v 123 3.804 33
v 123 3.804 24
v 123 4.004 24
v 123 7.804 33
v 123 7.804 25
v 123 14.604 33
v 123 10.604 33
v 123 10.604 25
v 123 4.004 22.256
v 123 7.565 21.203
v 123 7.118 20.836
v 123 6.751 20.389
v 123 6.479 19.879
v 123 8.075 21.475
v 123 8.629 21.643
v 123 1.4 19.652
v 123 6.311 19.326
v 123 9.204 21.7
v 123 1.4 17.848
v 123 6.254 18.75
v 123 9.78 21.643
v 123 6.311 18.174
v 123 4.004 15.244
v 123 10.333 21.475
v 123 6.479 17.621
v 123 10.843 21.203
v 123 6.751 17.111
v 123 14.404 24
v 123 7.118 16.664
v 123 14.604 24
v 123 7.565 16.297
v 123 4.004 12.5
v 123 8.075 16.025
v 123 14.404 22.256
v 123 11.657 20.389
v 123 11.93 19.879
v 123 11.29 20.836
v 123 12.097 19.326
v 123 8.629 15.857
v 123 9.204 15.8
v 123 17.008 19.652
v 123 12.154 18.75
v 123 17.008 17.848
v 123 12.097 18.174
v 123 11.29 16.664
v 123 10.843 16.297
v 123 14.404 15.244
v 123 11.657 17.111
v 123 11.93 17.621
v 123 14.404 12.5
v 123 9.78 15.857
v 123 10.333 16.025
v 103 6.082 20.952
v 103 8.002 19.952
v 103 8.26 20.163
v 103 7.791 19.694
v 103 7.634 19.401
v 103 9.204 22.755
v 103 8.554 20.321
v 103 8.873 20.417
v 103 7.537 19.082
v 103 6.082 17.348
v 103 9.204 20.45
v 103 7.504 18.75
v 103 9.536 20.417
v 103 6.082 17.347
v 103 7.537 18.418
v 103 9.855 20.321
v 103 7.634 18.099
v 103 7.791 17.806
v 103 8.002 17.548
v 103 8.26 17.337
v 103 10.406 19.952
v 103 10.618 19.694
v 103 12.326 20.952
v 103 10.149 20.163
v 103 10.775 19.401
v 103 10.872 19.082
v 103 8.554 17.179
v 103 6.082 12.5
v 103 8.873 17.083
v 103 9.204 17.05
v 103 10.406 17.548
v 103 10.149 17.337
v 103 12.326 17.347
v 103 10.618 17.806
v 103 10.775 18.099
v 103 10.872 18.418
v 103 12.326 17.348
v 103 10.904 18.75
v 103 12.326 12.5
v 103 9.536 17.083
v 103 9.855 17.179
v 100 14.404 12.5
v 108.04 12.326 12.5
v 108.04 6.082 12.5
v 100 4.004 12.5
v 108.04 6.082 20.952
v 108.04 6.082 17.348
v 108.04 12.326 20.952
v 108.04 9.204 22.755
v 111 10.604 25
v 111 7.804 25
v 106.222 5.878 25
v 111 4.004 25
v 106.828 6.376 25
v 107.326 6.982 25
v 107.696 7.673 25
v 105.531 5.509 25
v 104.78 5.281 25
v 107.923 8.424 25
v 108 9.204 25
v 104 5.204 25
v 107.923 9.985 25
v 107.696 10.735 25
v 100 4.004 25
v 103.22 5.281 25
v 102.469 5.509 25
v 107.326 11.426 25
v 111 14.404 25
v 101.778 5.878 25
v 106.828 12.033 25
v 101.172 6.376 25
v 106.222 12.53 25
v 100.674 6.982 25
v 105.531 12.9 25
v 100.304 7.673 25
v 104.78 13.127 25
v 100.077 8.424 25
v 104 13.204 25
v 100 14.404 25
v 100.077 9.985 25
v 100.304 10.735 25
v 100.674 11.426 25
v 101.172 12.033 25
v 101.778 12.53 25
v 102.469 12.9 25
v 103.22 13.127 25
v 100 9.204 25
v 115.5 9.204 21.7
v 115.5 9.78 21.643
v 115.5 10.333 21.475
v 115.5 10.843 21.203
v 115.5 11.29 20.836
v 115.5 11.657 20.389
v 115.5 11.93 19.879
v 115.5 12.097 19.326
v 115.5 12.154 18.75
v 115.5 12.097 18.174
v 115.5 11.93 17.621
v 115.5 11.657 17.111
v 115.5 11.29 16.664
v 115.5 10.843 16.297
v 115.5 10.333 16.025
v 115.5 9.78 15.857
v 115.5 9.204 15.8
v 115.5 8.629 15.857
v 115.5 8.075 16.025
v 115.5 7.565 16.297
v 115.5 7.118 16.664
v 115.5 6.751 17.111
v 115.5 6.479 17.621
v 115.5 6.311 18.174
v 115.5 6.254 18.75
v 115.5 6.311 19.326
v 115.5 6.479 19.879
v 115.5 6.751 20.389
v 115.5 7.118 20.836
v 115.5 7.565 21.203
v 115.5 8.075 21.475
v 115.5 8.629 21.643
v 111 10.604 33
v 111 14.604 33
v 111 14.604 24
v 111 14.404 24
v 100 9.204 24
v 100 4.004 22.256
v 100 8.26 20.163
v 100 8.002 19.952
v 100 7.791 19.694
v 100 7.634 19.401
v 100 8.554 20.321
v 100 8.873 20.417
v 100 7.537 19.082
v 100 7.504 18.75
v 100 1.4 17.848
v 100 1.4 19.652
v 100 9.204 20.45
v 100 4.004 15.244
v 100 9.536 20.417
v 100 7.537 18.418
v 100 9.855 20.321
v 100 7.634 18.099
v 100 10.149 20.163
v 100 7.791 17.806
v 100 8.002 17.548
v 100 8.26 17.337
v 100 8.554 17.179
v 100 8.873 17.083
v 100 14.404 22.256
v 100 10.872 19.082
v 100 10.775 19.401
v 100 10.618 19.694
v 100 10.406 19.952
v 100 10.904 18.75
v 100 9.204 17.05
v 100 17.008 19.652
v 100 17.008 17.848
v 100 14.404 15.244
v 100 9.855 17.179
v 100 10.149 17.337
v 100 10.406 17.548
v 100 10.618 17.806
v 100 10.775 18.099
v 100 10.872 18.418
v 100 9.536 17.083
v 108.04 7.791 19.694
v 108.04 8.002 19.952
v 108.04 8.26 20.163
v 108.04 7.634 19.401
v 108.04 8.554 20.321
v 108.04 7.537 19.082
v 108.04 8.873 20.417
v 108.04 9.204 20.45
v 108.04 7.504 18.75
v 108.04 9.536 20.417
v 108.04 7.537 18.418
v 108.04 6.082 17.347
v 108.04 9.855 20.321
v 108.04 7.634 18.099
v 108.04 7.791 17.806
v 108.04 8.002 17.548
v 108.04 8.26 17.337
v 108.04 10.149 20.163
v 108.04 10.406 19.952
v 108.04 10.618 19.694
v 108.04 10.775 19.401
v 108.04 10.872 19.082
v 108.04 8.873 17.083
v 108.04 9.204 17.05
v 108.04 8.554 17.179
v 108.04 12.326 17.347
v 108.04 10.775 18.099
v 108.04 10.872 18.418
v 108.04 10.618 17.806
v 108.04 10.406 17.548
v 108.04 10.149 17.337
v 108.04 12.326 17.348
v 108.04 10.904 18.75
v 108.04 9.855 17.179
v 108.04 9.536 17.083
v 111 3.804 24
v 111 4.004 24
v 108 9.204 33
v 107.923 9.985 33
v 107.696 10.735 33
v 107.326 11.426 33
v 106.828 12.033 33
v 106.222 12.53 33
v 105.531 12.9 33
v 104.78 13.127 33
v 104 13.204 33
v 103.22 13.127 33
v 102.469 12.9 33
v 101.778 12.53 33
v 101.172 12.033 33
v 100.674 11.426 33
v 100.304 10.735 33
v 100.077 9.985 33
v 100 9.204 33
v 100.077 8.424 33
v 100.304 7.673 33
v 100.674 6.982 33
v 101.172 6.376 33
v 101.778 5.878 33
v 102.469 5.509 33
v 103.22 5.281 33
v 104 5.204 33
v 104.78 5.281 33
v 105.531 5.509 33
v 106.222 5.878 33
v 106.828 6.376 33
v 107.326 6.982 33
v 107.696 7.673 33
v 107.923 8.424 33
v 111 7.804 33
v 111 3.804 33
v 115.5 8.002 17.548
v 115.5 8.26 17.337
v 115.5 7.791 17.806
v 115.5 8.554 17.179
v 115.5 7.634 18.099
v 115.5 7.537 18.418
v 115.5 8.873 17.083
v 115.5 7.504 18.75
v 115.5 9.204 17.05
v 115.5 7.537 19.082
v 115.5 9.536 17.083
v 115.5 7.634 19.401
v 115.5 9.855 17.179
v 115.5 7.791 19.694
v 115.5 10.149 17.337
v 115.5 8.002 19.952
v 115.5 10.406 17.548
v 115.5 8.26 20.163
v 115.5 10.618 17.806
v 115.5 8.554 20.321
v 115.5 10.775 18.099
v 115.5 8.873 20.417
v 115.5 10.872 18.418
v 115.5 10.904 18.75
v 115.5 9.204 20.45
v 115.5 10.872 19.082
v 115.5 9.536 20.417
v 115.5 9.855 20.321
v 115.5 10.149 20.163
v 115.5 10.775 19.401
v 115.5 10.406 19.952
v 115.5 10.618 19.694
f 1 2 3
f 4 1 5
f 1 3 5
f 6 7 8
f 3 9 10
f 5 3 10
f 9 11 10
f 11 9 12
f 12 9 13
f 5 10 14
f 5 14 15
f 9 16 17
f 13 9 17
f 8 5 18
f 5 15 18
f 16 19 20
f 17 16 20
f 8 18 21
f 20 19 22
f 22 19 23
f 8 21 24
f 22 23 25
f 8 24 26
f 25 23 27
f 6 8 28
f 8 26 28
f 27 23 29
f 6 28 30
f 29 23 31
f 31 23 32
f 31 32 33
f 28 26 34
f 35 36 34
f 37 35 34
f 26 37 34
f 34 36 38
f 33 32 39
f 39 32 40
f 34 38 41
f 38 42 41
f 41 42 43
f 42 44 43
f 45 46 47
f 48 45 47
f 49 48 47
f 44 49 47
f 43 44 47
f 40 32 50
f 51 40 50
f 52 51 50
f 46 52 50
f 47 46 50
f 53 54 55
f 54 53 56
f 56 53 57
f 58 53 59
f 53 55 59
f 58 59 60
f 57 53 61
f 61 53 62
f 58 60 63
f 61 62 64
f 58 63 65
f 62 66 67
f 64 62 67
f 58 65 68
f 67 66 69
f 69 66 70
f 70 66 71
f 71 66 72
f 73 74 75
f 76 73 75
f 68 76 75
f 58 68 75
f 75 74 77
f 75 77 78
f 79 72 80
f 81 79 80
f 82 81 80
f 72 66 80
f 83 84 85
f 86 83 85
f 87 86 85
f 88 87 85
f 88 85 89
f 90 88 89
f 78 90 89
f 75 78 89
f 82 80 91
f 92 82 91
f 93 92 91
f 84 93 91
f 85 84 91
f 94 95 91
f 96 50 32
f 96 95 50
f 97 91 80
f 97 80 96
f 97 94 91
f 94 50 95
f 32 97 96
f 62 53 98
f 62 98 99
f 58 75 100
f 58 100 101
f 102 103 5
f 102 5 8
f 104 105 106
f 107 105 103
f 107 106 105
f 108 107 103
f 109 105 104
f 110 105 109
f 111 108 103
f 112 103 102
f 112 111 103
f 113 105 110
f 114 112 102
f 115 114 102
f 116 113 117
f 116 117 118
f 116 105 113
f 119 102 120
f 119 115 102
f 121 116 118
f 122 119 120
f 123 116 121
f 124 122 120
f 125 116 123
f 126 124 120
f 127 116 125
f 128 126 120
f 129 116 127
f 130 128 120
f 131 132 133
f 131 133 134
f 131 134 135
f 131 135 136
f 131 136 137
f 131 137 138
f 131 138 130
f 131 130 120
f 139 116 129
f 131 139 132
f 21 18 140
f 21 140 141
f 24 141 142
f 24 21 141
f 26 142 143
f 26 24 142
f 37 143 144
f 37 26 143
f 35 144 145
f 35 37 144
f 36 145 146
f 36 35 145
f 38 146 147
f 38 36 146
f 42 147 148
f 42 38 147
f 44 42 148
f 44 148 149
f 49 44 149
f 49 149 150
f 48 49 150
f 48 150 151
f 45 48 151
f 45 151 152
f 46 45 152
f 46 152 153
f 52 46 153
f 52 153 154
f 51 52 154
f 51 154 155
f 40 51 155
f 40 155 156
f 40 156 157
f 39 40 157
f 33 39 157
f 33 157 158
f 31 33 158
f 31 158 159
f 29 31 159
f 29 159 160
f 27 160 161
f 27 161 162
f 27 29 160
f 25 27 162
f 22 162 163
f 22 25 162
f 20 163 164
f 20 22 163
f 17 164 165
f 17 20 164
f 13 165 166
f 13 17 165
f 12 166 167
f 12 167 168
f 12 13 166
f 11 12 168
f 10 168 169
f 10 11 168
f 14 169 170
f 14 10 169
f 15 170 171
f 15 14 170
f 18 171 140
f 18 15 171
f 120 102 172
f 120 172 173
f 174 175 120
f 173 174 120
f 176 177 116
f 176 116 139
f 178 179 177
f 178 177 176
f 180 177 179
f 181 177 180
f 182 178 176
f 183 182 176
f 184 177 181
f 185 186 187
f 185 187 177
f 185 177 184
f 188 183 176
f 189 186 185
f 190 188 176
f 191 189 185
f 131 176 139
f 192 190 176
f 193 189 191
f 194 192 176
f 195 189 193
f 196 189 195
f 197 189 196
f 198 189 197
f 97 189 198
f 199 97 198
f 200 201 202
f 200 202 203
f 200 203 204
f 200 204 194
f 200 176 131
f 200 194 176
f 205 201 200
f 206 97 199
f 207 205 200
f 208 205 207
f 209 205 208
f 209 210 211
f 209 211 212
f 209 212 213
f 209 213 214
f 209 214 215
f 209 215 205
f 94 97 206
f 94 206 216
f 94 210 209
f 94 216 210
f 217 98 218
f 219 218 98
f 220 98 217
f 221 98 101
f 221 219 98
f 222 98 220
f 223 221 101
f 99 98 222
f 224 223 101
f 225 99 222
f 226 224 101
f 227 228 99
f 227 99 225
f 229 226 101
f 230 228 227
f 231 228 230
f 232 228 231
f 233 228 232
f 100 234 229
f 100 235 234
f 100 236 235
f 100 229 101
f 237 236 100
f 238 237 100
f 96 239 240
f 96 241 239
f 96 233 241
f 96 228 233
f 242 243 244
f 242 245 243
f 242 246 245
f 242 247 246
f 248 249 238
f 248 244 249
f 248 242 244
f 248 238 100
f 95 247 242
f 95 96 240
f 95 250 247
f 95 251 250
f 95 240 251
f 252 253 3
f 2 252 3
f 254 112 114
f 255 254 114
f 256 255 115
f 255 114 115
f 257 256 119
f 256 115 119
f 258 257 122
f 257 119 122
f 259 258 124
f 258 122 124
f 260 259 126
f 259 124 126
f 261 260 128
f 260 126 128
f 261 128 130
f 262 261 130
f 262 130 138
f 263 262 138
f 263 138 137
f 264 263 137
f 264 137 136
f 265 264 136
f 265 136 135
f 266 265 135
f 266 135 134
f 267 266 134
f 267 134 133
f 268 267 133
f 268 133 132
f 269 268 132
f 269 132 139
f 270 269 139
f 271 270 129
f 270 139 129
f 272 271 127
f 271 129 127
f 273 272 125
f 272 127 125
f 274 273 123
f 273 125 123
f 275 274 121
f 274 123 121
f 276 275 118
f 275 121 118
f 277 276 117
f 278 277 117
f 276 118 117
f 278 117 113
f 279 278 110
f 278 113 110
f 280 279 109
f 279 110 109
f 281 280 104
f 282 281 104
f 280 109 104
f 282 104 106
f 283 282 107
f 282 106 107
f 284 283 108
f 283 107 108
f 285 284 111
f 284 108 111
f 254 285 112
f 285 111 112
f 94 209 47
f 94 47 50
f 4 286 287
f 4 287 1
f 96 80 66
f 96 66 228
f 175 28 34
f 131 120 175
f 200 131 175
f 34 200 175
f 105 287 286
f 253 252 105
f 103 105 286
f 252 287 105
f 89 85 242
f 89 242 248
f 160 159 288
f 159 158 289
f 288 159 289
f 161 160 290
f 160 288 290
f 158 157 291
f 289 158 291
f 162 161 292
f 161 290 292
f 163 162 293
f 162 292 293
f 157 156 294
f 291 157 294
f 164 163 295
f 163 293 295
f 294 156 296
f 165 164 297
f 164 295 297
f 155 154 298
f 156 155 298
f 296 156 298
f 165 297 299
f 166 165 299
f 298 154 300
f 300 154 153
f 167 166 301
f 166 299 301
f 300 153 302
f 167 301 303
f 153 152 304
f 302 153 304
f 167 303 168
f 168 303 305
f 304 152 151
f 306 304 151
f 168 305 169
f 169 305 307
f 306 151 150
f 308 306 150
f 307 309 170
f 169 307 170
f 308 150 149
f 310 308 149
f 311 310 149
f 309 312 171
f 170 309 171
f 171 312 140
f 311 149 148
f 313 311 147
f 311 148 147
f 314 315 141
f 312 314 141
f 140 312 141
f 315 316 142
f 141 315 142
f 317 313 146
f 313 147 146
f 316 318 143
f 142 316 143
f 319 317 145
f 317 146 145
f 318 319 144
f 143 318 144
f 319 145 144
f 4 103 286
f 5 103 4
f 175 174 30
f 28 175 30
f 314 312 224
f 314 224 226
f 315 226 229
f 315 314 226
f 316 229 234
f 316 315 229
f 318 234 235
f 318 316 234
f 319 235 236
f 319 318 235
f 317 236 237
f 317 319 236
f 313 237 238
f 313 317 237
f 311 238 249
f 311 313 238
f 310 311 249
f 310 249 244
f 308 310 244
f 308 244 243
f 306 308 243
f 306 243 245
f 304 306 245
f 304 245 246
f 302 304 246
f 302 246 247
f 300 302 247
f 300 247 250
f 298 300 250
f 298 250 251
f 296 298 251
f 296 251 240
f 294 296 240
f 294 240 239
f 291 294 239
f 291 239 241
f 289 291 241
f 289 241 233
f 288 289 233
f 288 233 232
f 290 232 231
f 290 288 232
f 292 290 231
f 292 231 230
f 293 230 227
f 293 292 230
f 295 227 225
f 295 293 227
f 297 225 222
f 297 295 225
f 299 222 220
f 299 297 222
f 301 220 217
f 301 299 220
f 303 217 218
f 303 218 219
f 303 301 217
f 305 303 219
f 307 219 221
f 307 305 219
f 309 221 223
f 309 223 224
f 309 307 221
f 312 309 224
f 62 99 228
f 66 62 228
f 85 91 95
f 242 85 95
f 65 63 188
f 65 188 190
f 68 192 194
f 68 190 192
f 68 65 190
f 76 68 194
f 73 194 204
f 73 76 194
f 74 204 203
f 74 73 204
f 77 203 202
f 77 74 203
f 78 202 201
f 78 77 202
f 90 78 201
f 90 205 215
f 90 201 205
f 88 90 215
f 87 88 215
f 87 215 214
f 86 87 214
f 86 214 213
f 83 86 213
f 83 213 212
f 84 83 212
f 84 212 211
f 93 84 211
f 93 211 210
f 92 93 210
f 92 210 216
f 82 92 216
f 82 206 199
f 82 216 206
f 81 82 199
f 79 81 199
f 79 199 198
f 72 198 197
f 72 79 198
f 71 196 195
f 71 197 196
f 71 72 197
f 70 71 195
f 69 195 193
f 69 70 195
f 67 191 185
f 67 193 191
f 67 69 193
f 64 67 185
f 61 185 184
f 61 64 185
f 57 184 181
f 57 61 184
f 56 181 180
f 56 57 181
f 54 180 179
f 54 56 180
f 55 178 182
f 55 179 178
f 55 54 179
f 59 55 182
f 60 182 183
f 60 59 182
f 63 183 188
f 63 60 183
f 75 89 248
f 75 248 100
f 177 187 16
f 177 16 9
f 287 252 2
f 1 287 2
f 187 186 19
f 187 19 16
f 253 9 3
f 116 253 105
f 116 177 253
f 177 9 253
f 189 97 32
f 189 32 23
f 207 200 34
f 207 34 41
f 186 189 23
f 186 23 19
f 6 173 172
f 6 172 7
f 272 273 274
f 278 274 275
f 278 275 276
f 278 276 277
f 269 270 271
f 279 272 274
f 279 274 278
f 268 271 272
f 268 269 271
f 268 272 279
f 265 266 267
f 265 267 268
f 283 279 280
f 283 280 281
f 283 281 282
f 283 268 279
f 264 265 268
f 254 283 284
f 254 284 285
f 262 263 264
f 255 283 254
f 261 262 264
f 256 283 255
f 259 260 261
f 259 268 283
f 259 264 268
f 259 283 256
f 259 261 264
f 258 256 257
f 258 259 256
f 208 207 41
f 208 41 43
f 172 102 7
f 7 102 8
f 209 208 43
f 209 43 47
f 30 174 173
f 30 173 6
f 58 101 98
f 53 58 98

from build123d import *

# Parameters (mm, degrees)
GT2CLAMP0_BASE_LSCREW_NUT_DEPTH       = 5.04
GT2CLAMP0_BASE_LSCREW_NUT_PITCH_ANGLE = 90
GT2CLAMP0_BASE_LSCREW_NUT2_W          = 5.04
GT2CLAMP0_BASE_LSCREW_NUT2_H          = 6.24386
GT2CLAMP0_BASE_LSCREW_NUT2_DEPTH      = 6.65
GT2CLAMP0_BASE_LSCREW_HEAD_R          = 2.95
GT2CLAMP0_BASE_LSCREW_HEAD_DEPTH      = 8.5
GT2CLAMP0_BASE_LSCREW_SHANK_R         = 1.7
GT2CLAMP0_BASE_LSCREW_SHANK_DEPTH     = 25
GT2CLAMP0_BASE_LSCREW_PITCH_ANGLE     = -90
GT2CLAMP0_CB3_W                       = 12
GT2CLAMP0_CB3_H                       = 4
GT2CLAMP0_CB3_DEPTH                   = 9
GT2CLAMP0_CYL_R                       = 4
GT2CLAMP0_CYL_DEPTH                   = 9
GT2CLAMP0EXTR_BASE_DEPTH              = 23
GT2CLAMP0_CB1_W                       = 12
GT2CLAMP0_CB1_H                       = 4
GT2CLAMP0_CB1_DEPTH                   = 9


with BuildPart() as gt2clamp0_base_lscrew_nut:
    # gt2clamp0_base_lscrew_nut → gt2clamp0_base_lscrew_nut (new body)
    with BuildSketch(Plane.XY):
        Polygon((3.605, 0), (1.8025, 3.122022), (-1.8025, 3.122022), (-3.605, 0), (-1.8025, -3.122022), (1.8025, -3.122022), align=None)
    extrude(amount=GT2CLAMP0_BASE_LSCREW_NUT_DEPTH)


with BuildPart() as gt2clamp0_base_lscrew_nut_1:
    # gt2clamp0_base_lscrew_nut pitch: moved
    add(gt2clamp0_base_lscrew_nut.part.rotate(Axis((0, 0, 0), (0, 1, 0)), GT2CLAMP0_BASE_LSCREW_NUT_PITCH_ANGLE))


with BuildPart() as gt2clamp0_base_lscrew_nut_2:
    # gt2clamp0_base_lscrew_nut placement: moved
    add(gt2clamp0_base_lscrew_nut_1.part.moved(Location((3, 8.004167, 6.65))))


with BuildPart() as gt2clamp0_base_lscrew_nut2:
    # gt2clamp0_base_lscrew_nut2 → gt2clamp0_base_lscrew_nut2 (new body)
    with BuildSketch(Plane(origin=(3, 4.882237, 0), x_dir=(1, 0, 0), z_dir=(0, 0, 1))):
        with Locations((2.52, 3.12193)):
            Rectangle(GT2CLAMP0_BASE_LSCREW_NUT2_W, GT2CLAMP0_BASE_LSCREW_NUT2_H)
    extrude(amount=GT2CLAMP0_BASE_LSCREW_NUT2_DEPTH)


with BuildPart() as gt2clamp0_base_lscrew_head:
    # gt2clamp0_base_lscrew_head → gt2clamp0_base_lscrew_head (new body)
    with BuildSketch(Plane.XY.offset(-1)):
        Circle(GT2CLAMP0_BASE_LSCREW_HEAD_R)
    extrude(amount=GT2CLAMP0_BASE_LSCREW_HEAD_DEPTH)


with BuildPart() as gt2clamp0_clamp_hole:
    # gt2clamp0_base_lscrew_shank → gt2clamp0_base_lscrew_shank (new body)
    with BuildSketch(Plane.XY.offset(-1)):
        Circle(GT2CLAMP0_BASE_LSCREW_SHANK_R)
    extrude(amount=GT2CLAMP0_BASE_LSCREW_SHANK_DEPTH)

    # gt2clamp0_base_lscrew: union gt2clamp0_base_lscrew_head
    add(gt2clamp0_base_lscrew_head.part)


with BuildPart() as gt2clamp0_clamp_hole_1:
    # gt2clamp0_base_lscrew pitch: moved
    add(gt2clamp0_clamp_hole.part.rotate(Axis((0, 0, 0), (0, 1, 0)), GT2CLAMP0_BASE_LSCREW_PITCH_ANGLE))


with BuildPart() as gt2clamp0_clamp_hole_2:
    # gt2clamp0_base_lscrew placement: moved
    add(gt2clamp0_clamp_hole_1.part.moved(Location((23, 8.004167, 6.25))))

    # gt2clamp0_clamp_hole: union gt2clamp0_base_lscrew_nut, gt2clamp0_base_lscrew_nut2
    add(gt2clamp0_base_lscrew_nut_2.part)
    add(gt2clamp0_base_lscrew_nut2.part)


with BuildPart() as gt2clamp0_cb3:
    # gt2clamp0_cb3 → gt2clamp0_cb3 (new body)
    with BuildSketch(Plane(origin=(11, 9.404167, 11.5), x_dir=(1, 0, 0), z_dir=(0, 0, 1))):
        with Locations((6, 2)):
            Rectangle(GT2CLAMP0_CB3_W, GT2CLAMP0_CB3_H)
    extrude(amount=GT2CLAMP0_CB3_DEPTH)


with BuildPart() as gt2clamp0_cyl:
    # gt2clamp0_cyl → gt2clamp0_cyl (new body)
    with BuildSketch(Plane(origin=(4, 8.004167, 11.5), x_dir=(1, 0, 0), z_dir=(0, 0, 1))):
        Circle(GT2CLAMP0_CYL_R)
    extrude(amount=GT2CLAMP0_CYL_DEPTH)


with BuildPart() as gt2clamp0extr_base:
    # gt2clamp0base_plane_yz → gt2clamp0extr_base (new body)
    with BuildSketch(Plane(origin=(0, 8.004167, 6.25), x_dir=(0, 1, 0), z_dir=(-1, 0, 0))):
        Polygon((-5.2, 6.25), (-5.2, 3.50625), (-7.804167, 0.902083), (-7.804167, -0.902083), (-5.2, -3.50625), (-5.2, -6.25), (5.2, -6.25), (5.2, -3.50625), (7.804167, -0.902083), (7.804167, 0.902083), (5.2, 3.50625), (5.2, 6.25), align=None)
    extrude(amount=-GT2CLAMP0EXTR_BASE_DEPTH)


with BuildPart() as gt2clamp0:
    # gt2clamp0_cb1 → gt2clamp0_cb1 (new body)
    with BuildSketch(Plane(origin=(11, 2.604167, 11.5), x_dir=(1, 0, 0), z_dir=(0, 0, 1))):
        with Locations((6, 2)):
            Rectangle(GT2CLAMP0_CB1_W, GT2CLAMP0_CB1_H)
    extrude(amount=GT2CLAMP0_CB1_DEPTH)

    # gt2clamp0clamp_base: union gt2clamp0_cb3, gt2clamp0_cyl, gt2clamp0extr_base
    add(gt2clamp0_cb3.part)
    add(gt2clamp0_cyl.part)
    add(gt2clamp0extr_base.part)

    # gt2clamp0: cut gt2clamp0_clamp_hole
    add(gt2clamp0_clamp_hole_2.part, mode=Mode.SUBTRACT)


with BuildPart() as gt2clamp0_1:
    # gt2clamp0 placement: moved
    add(gt2clamp0.part.moved(Location((100, 1.2, 12.5))))


solid = gt2clamp0_1.part
